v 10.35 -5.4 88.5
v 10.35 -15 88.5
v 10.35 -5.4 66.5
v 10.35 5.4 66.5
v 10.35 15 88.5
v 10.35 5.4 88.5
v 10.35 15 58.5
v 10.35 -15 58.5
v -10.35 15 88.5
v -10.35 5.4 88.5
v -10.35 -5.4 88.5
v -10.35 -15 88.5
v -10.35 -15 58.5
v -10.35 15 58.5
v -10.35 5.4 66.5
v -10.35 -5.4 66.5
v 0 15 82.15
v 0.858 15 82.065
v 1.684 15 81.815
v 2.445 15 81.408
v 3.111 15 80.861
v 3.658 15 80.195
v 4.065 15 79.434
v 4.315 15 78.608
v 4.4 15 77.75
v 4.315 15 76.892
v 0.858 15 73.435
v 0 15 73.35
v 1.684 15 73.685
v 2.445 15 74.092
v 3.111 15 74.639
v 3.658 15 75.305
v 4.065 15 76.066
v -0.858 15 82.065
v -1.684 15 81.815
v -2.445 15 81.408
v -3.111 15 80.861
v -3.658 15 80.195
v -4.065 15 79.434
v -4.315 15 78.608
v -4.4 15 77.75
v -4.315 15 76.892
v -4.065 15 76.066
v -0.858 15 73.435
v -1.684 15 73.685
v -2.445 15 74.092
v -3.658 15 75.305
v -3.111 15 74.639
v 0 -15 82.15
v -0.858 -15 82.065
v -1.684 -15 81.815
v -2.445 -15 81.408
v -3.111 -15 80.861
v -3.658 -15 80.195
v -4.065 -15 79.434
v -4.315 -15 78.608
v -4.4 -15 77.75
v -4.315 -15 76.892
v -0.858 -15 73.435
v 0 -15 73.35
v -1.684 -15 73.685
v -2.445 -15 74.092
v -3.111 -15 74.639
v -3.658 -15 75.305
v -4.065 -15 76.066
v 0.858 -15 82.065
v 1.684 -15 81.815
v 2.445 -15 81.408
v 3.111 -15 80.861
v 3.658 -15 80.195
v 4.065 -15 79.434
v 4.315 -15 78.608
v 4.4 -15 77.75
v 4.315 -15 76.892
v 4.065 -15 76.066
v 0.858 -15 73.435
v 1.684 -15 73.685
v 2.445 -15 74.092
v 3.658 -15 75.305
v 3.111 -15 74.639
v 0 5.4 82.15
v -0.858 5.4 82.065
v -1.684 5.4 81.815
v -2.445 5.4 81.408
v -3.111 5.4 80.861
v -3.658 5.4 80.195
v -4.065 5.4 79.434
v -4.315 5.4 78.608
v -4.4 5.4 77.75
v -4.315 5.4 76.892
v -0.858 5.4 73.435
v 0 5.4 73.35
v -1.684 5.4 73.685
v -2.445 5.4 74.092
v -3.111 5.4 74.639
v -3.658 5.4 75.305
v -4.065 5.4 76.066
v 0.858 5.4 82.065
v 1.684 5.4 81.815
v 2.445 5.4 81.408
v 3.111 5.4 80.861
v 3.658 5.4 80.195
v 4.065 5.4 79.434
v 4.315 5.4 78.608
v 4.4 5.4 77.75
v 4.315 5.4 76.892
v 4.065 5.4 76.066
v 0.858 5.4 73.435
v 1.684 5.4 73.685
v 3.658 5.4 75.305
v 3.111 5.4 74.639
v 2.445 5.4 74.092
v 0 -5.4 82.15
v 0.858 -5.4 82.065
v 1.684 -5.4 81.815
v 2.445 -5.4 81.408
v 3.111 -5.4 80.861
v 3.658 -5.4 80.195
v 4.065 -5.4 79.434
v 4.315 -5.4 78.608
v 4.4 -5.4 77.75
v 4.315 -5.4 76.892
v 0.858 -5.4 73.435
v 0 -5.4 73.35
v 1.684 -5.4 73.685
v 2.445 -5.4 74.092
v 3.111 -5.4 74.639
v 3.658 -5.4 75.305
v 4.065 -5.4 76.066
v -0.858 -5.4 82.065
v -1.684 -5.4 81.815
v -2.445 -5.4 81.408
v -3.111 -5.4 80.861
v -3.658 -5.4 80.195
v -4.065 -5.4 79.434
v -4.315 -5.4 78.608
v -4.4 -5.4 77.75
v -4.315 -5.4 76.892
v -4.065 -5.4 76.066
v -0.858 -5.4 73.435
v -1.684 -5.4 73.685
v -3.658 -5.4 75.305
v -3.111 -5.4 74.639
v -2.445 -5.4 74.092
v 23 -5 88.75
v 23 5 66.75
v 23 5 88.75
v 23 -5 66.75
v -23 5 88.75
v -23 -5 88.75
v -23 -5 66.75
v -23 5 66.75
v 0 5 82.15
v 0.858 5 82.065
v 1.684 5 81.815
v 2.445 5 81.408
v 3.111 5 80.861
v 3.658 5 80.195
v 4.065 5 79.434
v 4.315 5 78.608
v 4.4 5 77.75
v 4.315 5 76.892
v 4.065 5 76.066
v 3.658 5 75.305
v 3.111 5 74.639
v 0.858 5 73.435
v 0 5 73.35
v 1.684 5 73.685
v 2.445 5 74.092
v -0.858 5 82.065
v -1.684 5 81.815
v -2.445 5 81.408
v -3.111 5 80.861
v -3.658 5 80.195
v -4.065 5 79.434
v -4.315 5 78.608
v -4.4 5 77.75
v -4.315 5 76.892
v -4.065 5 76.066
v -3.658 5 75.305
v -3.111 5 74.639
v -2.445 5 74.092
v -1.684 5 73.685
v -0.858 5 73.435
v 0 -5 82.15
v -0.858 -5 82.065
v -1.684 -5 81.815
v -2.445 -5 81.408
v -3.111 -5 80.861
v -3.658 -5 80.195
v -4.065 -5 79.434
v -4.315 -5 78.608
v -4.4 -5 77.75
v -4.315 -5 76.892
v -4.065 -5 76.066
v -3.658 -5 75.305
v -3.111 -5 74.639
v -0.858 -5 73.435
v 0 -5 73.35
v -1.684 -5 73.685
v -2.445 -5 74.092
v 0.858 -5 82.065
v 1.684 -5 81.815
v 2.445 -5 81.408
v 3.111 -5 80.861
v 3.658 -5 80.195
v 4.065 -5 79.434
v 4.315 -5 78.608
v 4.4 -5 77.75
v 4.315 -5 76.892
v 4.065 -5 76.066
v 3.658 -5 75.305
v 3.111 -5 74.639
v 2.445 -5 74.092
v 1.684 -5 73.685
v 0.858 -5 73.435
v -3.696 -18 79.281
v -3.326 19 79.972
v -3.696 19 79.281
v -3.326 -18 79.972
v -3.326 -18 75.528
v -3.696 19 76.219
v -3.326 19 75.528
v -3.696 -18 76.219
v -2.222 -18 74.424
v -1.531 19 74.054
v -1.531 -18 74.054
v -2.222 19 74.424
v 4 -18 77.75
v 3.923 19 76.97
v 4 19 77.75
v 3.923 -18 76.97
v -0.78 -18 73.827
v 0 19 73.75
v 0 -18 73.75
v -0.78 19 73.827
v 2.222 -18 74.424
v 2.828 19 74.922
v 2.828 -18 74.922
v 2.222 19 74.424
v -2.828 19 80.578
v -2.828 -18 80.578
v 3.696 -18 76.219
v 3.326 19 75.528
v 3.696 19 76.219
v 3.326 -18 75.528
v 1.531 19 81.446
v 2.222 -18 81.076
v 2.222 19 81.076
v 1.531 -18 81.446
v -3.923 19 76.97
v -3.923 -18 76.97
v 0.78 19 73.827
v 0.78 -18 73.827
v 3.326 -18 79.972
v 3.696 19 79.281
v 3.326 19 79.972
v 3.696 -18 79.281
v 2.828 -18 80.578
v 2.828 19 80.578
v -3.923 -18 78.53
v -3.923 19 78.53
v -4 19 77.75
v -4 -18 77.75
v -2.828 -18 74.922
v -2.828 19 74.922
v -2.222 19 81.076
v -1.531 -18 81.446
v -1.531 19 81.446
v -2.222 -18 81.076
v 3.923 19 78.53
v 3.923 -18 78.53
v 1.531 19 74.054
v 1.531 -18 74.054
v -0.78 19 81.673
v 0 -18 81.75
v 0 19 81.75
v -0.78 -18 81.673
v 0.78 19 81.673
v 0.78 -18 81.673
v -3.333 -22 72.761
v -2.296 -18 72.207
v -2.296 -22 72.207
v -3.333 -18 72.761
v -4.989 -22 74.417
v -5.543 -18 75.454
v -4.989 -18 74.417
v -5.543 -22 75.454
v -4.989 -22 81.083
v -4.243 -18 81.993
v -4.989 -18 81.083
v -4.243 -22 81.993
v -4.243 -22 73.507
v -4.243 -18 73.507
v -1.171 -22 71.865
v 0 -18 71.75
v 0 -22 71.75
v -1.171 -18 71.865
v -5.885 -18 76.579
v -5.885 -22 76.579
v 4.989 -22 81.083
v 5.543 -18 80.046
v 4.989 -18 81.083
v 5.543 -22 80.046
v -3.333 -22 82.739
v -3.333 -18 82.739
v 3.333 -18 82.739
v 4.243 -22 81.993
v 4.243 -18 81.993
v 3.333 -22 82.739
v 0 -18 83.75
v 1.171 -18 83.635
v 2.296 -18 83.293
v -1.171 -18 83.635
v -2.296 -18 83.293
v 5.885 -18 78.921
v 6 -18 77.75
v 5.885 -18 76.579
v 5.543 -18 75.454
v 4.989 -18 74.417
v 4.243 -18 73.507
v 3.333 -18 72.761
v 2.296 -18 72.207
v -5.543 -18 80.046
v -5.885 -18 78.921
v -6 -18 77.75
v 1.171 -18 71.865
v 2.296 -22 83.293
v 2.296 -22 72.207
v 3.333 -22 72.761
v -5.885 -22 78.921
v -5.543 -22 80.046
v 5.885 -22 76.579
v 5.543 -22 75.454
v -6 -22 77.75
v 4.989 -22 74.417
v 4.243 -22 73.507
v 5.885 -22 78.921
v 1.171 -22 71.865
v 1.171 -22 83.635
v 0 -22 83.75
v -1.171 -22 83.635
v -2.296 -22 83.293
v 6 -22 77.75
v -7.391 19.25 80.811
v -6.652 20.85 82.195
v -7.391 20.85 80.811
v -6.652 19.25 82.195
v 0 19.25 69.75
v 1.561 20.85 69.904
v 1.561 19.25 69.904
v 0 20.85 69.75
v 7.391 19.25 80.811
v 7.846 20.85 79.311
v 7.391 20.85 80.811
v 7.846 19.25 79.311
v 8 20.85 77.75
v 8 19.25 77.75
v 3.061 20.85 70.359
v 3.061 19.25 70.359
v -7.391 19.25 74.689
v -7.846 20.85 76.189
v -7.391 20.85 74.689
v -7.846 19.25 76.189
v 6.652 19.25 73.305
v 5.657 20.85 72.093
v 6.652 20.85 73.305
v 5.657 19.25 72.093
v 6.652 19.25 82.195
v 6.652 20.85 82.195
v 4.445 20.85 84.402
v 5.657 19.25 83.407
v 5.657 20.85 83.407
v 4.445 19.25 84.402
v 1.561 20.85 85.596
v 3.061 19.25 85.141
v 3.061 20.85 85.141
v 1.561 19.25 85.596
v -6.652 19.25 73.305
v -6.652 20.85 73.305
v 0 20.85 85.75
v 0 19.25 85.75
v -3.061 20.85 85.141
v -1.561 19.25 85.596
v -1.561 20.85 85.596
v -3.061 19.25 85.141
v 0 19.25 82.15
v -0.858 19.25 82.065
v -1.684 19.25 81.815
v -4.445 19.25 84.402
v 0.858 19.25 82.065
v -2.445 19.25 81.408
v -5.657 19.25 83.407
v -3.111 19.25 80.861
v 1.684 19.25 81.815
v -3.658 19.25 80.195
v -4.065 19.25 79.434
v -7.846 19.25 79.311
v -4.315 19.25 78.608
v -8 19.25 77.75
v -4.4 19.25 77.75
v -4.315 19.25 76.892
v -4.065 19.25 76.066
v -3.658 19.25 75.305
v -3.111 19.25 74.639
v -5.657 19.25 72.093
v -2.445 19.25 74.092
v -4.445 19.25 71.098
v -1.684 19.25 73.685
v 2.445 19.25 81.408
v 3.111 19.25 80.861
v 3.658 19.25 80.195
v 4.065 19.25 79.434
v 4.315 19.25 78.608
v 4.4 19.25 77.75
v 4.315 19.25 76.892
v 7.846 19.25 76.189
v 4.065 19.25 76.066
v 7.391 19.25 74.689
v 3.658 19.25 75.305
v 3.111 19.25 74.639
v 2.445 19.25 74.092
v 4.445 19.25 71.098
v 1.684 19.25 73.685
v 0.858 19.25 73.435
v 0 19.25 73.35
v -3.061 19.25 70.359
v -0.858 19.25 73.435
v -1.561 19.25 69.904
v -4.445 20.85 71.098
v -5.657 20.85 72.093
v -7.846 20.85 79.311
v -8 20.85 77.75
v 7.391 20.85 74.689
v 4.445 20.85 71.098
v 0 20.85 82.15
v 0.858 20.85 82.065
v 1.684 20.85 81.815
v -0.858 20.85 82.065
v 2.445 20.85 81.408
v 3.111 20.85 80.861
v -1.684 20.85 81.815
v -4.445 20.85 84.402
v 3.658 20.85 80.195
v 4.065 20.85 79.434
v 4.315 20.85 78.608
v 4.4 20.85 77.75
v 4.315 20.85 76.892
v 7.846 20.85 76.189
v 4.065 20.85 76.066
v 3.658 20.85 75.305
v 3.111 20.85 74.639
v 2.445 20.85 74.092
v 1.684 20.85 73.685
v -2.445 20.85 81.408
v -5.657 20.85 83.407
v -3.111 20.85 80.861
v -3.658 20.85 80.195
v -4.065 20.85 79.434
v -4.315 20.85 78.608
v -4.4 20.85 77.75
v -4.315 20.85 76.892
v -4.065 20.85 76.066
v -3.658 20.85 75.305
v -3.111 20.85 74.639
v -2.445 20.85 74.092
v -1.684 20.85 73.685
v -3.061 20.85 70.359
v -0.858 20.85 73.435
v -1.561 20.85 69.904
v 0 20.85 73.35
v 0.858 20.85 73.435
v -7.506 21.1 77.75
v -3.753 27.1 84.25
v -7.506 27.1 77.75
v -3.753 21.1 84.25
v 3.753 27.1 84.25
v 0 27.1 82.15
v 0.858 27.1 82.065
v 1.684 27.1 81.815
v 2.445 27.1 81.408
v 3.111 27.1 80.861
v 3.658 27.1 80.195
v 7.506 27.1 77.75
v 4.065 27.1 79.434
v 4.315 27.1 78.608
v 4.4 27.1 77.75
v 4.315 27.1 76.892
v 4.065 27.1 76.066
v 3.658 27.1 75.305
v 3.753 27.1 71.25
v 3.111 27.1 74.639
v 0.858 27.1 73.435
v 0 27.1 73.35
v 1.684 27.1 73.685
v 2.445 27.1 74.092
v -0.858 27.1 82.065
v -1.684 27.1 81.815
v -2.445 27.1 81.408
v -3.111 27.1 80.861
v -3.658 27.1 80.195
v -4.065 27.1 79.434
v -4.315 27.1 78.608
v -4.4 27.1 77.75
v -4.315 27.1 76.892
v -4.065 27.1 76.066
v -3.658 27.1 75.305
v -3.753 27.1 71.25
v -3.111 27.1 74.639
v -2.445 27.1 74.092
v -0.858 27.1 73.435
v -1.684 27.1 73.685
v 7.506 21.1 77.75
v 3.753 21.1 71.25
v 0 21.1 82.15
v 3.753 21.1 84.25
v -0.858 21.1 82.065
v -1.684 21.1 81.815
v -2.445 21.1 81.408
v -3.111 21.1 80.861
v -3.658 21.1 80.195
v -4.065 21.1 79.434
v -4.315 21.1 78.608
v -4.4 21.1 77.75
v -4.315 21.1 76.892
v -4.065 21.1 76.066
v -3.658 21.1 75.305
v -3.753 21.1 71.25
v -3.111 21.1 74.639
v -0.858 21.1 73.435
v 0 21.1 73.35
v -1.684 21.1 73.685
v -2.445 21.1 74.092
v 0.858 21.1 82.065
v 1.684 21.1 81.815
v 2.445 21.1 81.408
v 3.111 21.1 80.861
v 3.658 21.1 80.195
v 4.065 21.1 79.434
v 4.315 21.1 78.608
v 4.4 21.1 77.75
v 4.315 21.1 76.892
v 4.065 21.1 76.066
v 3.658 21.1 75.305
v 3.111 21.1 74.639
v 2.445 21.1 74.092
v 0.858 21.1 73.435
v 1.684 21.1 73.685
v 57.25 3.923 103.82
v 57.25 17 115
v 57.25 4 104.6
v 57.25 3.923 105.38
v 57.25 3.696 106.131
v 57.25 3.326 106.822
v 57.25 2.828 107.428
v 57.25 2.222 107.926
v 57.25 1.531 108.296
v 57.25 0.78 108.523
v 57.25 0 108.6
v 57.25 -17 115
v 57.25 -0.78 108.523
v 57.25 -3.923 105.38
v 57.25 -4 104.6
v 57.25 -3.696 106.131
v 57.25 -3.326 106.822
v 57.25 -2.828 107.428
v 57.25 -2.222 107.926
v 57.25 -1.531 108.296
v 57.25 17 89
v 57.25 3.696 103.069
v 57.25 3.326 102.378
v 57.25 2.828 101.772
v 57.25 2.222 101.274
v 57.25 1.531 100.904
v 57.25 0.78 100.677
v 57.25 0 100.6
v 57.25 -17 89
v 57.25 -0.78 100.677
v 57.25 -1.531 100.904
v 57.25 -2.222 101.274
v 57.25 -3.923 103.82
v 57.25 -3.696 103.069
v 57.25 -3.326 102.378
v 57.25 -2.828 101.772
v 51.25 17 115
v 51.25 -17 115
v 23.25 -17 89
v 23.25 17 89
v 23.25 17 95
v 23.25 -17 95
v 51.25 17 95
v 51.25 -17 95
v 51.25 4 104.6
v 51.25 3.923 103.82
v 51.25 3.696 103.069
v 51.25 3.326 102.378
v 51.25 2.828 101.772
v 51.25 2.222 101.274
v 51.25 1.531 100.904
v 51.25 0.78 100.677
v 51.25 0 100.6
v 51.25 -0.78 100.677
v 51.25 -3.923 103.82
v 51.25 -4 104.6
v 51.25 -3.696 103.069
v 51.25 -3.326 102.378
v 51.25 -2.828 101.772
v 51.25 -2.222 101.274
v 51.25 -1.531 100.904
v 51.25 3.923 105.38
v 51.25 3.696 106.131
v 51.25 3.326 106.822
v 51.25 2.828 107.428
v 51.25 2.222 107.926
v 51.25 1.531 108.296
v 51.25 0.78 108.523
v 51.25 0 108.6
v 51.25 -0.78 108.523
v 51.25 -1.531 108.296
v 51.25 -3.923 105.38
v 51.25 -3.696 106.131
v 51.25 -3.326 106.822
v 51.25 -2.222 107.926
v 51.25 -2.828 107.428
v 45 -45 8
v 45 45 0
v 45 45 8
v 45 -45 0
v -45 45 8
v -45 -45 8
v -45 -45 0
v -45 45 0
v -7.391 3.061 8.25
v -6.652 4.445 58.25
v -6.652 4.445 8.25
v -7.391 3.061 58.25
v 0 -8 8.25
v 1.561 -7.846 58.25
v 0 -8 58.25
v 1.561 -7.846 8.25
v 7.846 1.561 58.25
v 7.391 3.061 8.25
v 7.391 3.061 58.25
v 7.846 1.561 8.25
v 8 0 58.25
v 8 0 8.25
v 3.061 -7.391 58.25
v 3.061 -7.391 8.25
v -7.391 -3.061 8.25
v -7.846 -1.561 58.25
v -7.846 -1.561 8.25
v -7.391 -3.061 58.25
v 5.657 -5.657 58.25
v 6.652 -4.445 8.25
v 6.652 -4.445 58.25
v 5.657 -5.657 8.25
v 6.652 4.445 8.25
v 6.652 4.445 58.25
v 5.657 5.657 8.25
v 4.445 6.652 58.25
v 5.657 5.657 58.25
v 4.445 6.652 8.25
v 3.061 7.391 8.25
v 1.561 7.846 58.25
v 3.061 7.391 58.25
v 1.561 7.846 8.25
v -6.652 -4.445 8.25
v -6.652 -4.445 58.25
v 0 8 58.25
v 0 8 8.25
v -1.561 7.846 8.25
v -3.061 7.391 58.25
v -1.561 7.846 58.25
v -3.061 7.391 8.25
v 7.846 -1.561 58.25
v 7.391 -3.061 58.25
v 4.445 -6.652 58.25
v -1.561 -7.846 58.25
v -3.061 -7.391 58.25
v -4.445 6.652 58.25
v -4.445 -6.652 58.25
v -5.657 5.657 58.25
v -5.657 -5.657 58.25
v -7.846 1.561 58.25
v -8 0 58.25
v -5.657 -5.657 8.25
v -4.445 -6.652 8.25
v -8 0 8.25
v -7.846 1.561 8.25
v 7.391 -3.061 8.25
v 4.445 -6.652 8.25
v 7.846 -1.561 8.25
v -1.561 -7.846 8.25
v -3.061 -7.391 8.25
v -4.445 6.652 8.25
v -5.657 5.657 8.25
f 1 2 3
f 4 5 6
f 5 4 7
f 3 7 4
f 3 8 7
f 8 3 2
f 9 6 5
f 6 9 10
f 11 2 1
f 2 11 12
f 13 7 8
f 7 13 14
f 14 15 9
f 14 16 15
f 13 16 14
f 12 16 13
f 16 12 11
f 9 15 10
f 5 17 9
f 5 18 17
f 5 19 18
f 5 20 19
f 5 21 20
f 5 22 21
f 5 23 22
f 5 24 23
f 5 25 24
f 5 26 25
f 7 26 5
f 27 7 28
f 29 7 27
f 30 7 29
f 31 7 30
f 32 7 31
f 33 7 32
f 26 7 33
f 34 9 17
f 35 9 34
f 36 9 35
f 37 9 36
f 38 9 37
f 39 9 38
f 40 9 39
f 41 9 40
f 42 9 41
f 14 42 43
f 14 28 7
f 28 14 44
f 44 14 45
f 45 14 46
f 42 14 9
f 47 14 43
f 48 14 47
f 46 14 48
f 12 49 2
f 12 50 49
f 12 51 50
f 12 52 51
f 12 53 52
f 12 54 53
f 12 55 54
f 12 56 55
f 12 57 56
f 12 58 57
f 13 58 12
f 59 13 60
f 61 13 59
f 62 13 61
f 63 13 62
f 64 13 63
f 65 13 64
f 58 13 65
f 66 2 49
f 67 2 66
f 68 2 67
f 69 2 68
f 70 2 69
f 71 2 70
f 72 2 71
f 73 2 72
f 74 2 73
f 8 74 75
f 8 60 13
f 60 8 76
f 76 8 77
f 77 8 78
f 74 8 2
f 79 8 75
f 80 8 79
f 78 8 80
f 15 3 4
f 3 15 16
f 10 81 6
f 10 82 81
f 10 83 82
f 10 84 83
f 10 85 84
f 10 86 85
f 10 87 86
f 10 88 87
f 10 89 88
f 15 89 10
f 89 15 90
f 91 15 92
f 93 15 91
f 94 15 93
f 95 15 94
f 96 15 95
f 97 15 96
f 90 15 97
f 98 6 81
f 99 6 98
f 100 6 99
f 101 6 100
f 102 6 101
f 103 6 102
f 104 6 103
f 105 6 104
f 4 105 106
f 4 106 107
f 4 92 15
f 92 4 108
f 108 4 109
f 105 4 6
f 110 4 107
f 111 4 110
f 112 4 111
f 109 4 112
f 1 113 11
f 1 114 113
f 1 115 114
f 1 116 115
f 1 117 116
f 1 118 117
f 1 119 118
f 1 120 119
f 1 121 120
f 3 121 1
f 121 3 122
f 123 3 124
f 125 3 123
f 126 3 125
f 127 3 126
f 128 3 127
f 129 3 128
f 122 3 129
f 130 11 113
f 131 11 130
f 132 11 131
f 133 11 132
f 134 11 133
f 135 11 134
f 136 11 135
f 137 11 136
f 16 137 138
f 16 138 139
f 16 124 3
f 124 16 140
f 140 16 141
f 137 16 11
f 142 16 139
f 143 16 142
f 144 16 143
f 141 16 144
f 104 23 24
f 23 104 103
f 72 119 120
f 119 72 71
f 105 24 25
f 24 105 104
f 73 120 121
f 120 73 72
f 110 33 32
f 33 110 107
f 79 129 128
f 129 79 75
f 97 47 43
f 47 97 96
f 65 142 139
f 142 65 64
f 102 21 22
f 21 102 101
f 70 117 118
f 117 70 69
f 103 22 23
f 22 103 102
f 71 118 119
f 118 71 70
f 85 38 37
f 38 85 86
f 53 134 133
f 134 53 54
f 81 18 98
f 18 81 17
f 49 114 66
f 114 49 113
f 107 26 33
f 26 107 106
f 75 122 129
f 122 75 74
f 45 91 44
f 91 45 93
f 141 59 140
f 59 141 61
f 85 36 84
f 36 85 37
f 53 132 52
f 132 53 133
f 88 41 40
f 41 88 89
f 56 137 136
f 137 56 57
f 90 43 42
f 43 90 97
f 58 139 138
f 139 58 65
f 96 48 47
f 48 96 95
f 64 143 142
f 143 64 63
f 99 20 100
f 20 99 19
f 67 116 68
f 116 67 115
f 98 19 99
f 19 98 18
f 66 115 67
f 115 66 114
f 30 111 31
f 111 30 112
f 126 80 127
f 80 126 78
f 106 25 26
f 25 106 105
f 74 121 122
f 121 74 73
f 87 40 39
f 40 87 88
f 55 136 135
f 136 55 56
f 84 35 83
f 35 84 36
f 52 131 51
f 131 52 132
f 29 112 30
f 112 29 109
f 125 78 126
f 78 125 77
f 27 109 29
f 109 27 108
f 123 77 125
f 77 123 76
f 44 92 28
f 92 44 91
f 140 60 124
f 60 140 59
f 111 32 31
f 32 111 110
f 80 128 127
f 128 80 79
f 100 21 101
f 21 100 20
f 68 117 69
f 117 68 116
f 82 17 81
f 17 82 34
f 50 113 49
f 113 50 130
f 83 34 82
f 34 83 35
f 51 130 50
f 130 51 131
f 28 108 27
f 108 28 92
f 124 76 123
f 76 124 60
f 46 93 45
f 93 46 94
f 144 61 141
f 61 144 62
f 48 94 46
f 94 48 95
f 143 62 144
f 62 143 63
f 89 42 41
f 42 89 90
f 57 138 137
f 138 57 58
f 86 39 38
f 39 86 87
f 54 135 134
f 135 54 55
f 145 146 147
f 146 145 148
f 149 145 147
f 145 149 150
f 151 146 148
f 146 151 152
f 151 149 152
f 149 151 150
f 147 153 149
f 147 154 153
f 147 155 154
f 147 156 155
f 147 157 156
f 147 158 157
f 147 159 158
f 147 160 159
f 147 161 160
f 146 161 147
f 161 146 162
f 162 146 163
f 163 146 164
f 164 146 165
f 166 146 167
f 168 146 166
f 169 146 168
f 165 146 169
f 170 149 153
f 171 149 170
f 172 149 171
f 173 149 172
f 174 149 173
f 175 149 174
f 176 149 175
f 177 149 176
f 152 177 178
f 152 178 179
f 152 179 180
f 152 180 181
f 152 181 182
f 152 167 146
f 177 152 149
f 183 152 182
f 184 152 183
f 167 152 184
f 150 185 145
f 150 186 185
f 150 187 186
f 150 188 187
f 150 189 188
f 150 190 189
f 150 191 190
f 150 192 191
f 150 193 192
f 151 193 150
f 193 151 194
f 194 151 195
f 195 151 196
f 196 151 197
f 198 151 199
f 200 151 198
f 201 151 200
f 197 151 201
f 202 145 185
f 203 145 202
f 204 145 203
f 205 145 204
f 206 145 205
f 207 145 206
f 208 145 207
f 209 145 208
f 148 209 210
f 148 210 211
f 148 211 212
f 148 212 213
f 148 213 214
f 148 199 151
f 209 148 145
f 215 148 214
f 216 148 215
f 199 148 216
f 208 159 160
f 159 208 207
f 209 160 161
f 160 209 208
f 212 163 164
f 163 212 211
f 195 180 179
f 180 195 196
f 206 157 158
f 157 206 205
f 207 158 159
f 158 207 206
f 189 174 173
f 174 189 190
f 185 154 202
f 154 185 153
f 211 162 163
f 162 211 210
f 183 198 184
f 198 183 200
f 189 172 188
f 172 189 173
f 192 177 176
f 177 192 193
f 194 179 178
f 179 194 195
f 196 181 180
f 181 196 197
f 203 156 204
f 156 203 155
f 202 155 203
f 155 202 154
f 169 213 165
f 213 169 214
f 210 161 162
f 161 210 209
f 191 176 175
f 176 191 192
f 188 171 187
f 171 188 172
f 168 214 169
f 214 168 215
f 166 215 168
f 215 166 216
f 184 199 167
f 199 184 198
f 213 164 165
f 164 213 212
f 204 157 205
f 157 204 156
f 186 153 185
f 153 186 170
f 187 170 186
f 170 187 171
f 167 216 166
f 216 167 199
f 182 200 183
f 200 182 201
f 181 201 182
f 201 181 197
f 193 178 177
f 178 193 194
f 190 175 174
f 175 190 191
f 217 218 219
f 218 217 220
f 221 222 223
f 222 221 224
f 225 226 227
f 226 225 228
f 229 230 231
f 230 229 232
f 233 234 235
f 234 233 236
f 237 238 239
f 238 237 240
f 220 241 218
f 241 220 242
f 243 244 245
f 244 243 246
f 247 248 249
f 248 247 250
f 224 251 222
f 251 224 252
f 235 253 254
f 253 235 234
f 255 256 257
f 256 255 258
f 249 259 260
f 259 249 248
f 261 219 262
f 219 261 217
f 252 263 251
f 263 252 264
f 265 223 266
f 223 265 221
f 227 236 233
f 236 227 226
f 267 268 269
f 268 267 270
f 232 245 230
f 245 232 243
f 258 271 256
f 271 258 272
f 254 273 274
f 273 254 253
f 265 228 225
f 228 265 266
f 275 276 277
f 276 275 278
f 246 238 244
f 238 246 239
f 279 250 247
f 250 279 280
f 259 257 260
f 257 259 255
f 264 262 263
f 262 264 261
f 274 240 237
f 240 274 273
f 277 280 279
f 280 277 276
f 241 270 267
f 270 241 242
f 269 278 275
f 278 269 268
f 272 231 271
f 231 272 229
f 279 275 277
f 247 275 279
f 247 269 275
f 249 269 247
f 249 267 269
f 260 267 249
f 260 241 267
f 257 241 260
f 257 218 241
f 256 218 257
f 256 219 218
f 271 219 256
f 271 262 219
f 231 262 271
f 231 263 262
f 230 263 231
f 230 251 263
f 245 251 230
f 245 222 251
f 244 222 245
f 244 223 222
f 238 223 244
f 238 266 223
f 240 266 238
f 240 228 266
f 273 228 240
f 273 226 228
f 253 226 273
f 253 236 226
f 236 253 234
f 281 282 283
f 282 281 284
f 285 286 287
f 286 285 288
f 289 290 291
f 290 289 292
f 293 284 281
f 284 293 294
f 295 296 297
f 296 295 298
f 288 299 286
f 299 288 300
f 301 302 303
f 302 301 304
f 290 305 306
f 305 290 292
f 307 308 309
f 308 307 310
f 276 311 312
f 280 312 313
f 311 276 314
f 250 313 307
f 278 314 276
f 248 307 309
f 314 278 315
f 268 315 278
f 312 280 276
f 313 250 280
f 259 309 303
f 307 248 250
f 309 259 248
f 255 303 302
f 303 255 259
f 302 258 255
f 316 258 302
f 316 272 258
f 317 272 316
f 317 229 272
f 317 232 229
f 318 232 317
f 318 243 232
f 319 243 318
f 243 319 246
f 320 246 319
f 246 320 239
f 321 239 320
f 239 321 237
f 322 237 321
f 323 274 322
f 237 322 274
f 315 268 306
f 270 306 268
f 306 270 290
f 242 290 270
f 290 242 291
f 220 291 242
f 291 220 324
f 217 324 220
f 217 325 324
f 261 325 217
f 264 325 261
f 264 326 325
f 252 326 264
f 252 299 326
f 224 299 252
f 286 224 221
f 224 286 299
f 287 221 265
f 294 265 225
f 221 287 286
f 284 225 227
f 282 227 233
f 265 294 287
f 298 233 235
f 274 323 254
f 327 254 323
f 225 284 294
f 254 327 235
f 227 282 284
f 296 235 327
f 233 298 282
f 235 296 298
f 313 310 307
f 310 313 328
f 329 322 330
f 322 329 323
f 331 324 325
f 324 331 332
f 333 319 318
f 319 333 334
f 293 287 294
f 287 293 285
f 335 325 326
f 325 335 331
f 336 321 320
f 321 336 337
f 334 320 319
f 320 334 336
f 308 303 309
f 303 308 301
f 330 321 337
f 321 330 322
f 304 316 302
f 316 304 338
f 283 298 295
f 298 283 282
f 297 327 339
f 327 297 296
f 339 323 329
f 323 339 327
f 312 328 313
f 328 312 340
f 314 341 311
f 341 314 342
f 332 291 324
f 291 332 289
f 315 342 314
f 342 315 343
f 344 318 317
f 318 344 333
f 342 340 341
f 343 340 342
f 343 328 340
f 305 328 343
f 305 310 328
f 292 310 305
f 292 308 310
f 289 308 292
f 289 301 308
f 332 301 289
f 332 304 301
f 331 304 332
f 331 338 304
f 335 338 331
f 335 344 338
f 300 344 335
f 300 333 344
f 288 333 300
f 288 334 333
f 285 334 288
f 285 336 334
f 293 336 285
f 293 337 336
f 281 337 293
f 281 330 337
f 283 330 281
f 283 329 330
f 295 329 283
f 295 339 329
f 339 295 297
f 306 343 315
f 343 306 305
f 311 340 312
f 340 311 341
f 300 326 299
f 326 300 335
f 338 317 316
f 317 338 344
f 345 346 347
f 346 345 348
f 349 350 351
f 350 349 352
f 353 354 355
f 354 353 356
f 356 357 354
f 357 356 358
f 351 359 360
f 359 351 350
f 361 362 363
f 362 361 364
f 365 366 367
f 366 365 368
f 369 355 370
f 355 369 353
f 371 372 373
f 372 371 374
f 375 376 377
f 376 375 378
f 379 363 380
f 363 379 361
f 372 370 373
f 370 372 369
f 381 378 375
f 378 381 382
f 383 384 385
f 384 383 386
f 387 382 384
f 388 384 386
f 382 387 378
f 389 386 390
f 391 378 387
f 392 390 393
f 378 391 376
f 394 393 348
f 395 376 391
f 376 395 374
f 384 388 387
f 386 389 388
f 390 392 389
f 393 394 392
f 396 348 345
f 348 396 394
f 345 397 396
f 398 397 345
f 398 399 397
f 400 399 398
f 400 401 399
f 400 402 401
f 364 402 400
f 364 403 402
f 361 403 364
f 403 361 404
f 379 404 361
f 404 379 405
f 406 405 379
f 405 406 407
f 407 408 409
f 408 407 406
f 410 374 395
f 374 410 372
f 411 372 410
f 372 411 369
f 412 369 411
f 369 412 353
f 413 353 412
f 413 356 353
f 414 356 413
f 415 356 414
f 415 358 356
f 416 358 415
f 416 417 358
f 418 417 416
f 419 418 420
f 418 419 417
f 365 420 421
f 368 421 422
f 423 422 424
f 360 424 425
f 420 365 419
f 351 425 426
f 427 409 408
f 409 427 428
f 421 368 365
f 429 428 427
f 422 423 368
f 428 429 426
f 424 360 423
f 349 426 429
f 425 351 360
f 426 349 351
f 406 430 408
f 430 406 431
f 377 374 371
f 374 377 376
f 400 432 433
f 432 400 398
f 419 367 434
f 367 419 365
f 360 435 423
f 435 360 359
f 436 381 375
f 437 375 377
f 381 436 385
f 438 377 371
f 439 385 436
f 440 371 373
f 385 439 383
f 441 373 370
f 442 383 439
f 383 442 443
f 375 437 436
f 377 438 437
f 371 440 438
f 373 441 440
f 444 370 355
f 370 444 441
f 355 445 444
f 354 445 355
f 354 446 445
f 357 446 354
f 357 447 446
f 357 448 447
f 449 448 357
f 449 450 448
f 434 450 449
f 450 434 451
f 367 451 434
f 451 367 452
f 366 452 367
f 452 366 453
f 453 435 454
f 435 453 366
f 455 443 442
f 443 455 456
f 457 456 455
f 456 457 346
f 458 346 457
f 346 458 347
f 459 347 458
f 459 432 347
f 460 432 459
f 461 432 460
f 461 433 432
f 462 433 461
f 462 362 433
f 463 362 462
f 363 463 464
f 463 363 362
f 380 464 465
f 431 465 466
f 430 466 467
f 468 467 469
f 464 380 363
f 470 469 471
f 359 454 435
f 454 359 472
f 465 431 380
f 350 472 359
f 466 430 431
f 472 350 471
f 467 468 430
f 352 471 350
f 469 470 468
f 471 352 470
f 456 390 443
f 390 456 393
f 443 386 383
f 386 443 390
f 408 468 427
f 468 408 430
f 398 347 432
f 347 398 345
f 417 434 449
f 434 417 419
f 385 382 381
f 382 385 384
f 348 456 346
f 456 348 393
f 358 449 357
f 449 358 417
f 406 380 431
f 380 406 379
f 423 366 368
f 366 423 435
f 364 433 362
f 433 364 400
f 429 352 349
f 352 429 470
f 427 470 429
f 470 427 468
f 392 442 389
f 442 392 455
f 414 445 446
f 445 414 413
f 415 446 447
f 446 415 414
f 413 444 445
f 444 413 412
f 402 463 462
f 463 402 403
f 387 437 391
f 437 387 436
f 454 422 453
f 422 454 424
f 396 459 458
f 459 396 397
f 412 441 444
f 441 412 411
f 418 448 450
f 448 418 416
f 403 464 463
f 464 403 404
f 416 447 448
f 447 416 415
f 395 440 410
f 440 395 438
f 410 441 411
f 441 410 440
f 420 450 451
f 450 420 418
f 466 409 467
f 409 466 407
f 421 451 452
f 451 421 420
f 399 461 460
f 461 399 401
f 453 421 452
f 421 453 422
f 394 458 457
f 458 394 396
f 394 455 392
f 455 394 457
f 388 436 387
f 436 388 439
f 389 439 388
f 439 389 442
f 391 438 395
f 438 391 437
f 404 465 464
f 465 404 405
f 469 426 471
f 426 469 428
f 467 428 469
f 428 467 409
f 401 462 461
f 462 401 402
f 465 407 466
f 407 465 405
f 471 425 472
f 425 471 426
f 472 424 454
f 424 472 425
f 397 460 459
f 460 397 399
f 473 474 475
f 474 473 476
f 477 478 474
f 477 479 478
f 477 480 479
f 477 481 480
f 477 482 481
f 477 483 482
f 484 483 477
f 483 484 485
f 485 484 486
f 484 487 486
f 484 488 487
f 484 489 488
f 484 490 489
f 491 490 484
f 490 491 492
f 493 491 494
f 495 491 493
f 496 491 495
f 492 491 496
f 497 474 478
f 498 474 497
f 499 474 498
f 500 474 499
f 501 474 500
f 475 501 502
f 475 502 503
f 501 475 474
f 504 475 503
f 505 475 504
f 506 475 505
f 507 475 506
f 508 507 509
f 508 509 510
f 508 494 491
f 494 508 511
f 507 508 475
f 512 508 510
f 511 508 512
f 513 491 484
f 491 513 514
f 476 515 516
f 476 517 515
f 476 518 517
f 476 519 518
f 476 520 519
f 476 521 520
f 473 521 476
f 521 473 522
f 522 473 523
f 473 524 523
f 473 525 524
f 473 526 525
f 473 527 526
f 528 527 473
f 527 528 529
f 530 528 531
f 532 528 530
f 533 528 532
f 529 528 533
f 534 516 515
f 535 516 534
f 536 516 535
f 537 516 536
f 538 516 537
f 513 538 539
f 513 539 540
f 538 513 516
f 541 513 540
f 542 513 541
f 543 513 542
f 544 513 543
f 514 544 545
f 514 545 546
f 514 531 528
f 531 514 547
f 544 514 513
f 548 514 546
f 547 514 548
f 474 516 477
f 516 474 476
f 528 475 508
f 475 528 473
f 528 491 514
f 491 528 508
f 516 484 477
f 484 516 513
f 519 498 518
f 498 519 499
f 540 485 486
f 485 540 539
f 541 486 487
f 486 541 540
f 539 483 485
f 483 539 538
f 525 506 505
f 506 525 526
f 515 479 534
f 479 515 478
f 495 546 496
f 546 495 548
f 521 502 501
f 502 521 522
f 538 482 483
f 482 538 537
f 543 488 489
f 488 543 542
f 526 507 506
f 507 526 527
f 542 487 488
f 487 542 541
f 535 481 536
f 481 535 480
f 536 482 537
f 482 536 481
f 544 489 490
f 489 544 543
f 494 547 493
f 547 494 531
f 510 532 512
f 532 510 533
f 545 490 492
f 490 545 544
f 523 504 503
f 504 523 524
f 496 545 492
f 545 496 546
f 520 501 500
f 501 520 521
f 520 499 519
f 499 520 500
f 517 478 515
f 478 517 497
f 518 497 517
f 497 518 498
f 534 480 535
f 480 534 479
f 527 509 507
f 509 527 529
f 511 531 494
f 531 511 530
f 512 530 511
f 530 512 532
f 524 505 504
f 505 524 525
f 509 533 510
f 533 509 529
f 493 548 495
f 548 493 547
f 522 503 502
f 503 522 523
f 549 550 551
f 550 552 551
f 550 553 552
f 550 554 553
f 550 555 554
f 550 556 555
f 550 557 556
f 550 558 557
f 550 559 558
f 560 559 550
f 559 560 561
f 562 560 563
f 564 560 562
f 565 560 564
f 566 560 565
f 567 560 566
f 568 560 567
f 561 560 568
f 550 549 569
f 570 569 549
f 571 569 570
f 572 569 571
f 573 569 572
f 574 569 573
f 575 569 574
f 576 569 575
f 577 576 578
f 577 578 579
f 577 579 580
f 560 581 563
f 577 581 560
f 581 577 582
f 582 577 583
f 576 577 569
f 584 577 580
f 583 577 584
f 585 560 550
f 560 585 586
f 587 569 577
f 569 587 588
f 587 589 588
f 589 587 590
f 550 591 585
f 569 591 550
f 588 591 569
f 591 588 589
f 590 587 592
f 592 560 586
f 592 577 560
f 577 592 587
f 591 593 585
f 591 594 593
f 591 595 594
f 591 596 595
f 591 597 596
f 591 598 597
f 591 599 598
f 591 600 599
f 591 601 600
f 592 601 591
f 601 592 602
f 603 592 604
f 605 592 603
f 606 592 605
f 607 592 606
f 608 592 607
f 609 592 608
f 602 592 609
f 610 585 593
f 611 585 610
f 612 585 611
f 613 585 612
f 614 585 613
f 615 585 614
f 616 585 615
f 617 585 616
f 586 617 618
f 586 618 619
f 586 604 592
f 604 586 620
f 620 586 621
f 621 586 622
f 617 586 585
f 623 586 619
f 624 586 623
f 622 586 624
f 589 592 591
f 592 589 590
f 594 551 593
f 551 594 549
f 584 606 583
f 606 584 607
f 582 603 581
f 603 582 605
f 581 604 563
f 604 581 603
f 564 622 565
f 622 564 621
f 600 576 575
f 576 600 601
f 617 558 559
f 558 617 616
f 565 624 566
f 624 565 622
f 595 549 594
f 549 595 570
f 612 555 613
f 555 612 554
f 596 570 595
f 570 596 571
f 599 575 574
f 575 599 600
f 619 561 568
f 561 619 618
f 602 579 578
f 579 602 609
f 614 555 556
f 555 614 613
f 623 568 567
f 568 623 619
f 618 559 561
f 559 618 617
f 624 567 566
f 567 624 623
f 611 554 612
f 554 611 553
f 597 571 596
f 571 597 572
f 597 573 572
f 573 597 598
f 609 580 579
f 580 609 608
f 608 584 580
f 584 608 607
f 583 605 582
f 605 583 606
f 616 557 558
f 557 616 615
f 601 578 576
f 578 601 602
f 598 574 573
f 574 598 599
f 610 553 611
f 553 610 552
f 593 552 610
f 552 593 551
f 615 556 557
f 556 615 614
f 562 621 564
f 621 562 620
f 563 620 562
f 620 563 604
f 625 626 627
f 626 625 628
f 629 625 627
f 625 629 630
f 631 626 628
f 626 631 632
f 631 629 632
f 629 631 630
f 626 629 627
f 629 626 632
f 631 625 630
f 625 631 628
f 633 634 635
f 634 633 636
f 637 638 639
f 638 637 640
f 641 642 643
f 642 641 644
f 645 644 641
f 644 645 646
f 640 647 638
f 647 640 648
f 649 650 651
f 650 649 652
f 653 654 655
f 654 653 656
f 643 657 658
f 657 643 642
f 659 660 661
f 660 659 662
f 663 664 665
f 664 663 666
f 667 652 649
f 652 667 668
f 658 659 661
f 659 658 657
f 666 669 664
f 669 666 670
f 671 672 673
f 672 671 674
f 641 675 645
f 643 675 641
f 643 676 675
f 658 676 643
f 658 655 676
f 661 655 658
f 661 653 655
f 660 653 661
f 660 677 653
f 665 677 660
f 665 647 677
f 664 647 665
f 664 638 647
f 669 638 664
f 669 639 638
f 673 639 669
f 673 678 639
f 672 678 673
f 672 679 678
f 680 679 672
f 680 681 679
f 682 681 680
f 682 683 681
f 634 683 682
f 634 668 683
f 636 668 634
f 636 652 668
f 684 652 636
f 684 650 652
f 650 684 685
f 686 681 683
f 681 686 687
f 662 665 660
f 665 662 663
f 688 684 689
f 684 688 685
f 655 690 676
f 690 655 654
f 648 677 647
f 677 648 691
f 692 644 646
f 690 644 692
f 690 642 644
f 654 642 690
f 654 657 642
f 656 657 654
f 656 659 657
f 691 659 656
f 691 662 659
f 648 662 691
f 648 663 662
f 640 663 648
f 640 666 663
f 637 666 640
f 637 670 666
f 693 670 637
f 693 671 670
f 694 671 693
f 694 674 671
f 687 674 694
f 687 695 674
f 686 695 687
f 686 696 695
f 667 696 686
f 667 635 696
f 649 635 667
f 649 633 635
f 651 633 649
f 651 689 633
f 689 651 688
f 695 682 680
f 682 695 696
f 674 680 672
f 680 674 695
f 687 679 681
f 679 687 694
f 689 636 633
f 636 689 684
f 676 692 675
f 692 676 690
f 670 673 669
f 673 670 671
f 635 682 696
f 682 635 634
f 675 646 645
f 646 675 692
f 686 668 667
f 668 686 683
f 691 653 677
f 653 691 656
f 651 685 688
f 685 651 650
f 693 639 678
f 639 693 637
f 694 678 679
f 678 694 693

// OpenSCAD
$fn = 32;

// ------------------------------------------------------------------------
// Lamp arm: column d16 x 50 mm, arm 46 mm
// Every part is its own module, assembly() places every instance.
// ------------------------------------------------------------------------

// --- part 1 ---
module lamp_base() {
  difference() {
    translate([-45, -45, 0]) cube([90, 90, 8]);
  }
}

// --- part 2 ---
module lamp_column() {
  cylinder(h = 50, d = 16);
}

// --- part 3 ---
module head_fork() {
  difference() {
    translate([-10.35, -15, 0]) cube([20.7, 30, 30]);
    translate([-11.35, -5.4, 8]) cube([22.7, 10.8, 23]);
    translate([0, 0, 19.25]) rotate([90, 0, 0]) cylinder(h = 32, d = 8.8, center = true);
  }
}

// --- part 4 ---
module lamp_arm() {
  difference() {
    translate([-23, -5, 0]) cube([46, 10, 22]);
    translate([0, 0, 11]) rotate([90, 0, 0]) cylinder(h = 12, d = 8.8, center = true);
  }
}

// --- part 5 ---
module arm_pin() {
  rotate([0, 90, 0]) cylinder(h = 38, d = 8, center = true);
  translate([-22, 0, 0]) rotate([0, 90, 0]) cylinder(h = 4, d = 12);
}

// --- part 6 ---
module arm_washer() {
  difference() {
      translate([0, 0, 0]) cylinder(h = 1.6, d = 16);
      translate([0, 0, -1]) cylinder(h = 3.6, d = 8.8);
    }
}

// --- part 7 ---
module arm_nut() {
  difference() {
    linear_extrude(height = 6) polygon(points = [[7.506, 0], [3.753, 6.5], [-3.753, 6.5], [-7.506, 0], [-3.753, -6.5], [3.753, -6.5]]);
    translate([0, 0, -1]) cylinder(h = 8, d = 8.8);
  }
}

// --- part 8 ---
module shade_bracket() {
  difference() {
    translate([-17, -17, 0]) cube([34, 34, 26]);
    translate([-18, -18, 6]) cube([29, 36, 21]);
    translate([14, 0, 15.6]) rotate([0, 90, 0]) cylinder(h = 8, d = 8, center = true);
  }
}

// --- assembly ---
module assembly() {
  color([0.80, 0.24, 0.20]) translate([0, 0, 0]) rotate([0, 0, 0]) lamp_base();
  color([0.20, 0.45, 0.75]) translate([0, 0, 8.25]) rotate([0, 0, 0]) lamp_column();
  color([0.25, 0.62, 0.32]) translate([0, 0, 58.5]) rotate([0, 0, 0]) head_fork();
  color([0.92, 0.70, 0.18]) translate([0, 0, 66.75]) rotate([0, 0, 0]) lamp_arm();
  color([0.58, 0.35, 0.70]) translate([0, 0, 77.75]) rotate([0, 0, 90]) arm_pin();
  color([0.16, 0.66, 0.66]) translate([0, 20.85, 77.75]) rotate([90, 0, 0]) arm_washer();
  color([0.85, 0.48, 0.18]) translate([0, 27.1, 77.75]) rotate([90, 0, 0]) arm_nut();
  color([0.55, 0.60, 0.65]) translate([40.25, 0, 89]) rotate([0, 0, 0]) shade_bracket();
}

assembly();
